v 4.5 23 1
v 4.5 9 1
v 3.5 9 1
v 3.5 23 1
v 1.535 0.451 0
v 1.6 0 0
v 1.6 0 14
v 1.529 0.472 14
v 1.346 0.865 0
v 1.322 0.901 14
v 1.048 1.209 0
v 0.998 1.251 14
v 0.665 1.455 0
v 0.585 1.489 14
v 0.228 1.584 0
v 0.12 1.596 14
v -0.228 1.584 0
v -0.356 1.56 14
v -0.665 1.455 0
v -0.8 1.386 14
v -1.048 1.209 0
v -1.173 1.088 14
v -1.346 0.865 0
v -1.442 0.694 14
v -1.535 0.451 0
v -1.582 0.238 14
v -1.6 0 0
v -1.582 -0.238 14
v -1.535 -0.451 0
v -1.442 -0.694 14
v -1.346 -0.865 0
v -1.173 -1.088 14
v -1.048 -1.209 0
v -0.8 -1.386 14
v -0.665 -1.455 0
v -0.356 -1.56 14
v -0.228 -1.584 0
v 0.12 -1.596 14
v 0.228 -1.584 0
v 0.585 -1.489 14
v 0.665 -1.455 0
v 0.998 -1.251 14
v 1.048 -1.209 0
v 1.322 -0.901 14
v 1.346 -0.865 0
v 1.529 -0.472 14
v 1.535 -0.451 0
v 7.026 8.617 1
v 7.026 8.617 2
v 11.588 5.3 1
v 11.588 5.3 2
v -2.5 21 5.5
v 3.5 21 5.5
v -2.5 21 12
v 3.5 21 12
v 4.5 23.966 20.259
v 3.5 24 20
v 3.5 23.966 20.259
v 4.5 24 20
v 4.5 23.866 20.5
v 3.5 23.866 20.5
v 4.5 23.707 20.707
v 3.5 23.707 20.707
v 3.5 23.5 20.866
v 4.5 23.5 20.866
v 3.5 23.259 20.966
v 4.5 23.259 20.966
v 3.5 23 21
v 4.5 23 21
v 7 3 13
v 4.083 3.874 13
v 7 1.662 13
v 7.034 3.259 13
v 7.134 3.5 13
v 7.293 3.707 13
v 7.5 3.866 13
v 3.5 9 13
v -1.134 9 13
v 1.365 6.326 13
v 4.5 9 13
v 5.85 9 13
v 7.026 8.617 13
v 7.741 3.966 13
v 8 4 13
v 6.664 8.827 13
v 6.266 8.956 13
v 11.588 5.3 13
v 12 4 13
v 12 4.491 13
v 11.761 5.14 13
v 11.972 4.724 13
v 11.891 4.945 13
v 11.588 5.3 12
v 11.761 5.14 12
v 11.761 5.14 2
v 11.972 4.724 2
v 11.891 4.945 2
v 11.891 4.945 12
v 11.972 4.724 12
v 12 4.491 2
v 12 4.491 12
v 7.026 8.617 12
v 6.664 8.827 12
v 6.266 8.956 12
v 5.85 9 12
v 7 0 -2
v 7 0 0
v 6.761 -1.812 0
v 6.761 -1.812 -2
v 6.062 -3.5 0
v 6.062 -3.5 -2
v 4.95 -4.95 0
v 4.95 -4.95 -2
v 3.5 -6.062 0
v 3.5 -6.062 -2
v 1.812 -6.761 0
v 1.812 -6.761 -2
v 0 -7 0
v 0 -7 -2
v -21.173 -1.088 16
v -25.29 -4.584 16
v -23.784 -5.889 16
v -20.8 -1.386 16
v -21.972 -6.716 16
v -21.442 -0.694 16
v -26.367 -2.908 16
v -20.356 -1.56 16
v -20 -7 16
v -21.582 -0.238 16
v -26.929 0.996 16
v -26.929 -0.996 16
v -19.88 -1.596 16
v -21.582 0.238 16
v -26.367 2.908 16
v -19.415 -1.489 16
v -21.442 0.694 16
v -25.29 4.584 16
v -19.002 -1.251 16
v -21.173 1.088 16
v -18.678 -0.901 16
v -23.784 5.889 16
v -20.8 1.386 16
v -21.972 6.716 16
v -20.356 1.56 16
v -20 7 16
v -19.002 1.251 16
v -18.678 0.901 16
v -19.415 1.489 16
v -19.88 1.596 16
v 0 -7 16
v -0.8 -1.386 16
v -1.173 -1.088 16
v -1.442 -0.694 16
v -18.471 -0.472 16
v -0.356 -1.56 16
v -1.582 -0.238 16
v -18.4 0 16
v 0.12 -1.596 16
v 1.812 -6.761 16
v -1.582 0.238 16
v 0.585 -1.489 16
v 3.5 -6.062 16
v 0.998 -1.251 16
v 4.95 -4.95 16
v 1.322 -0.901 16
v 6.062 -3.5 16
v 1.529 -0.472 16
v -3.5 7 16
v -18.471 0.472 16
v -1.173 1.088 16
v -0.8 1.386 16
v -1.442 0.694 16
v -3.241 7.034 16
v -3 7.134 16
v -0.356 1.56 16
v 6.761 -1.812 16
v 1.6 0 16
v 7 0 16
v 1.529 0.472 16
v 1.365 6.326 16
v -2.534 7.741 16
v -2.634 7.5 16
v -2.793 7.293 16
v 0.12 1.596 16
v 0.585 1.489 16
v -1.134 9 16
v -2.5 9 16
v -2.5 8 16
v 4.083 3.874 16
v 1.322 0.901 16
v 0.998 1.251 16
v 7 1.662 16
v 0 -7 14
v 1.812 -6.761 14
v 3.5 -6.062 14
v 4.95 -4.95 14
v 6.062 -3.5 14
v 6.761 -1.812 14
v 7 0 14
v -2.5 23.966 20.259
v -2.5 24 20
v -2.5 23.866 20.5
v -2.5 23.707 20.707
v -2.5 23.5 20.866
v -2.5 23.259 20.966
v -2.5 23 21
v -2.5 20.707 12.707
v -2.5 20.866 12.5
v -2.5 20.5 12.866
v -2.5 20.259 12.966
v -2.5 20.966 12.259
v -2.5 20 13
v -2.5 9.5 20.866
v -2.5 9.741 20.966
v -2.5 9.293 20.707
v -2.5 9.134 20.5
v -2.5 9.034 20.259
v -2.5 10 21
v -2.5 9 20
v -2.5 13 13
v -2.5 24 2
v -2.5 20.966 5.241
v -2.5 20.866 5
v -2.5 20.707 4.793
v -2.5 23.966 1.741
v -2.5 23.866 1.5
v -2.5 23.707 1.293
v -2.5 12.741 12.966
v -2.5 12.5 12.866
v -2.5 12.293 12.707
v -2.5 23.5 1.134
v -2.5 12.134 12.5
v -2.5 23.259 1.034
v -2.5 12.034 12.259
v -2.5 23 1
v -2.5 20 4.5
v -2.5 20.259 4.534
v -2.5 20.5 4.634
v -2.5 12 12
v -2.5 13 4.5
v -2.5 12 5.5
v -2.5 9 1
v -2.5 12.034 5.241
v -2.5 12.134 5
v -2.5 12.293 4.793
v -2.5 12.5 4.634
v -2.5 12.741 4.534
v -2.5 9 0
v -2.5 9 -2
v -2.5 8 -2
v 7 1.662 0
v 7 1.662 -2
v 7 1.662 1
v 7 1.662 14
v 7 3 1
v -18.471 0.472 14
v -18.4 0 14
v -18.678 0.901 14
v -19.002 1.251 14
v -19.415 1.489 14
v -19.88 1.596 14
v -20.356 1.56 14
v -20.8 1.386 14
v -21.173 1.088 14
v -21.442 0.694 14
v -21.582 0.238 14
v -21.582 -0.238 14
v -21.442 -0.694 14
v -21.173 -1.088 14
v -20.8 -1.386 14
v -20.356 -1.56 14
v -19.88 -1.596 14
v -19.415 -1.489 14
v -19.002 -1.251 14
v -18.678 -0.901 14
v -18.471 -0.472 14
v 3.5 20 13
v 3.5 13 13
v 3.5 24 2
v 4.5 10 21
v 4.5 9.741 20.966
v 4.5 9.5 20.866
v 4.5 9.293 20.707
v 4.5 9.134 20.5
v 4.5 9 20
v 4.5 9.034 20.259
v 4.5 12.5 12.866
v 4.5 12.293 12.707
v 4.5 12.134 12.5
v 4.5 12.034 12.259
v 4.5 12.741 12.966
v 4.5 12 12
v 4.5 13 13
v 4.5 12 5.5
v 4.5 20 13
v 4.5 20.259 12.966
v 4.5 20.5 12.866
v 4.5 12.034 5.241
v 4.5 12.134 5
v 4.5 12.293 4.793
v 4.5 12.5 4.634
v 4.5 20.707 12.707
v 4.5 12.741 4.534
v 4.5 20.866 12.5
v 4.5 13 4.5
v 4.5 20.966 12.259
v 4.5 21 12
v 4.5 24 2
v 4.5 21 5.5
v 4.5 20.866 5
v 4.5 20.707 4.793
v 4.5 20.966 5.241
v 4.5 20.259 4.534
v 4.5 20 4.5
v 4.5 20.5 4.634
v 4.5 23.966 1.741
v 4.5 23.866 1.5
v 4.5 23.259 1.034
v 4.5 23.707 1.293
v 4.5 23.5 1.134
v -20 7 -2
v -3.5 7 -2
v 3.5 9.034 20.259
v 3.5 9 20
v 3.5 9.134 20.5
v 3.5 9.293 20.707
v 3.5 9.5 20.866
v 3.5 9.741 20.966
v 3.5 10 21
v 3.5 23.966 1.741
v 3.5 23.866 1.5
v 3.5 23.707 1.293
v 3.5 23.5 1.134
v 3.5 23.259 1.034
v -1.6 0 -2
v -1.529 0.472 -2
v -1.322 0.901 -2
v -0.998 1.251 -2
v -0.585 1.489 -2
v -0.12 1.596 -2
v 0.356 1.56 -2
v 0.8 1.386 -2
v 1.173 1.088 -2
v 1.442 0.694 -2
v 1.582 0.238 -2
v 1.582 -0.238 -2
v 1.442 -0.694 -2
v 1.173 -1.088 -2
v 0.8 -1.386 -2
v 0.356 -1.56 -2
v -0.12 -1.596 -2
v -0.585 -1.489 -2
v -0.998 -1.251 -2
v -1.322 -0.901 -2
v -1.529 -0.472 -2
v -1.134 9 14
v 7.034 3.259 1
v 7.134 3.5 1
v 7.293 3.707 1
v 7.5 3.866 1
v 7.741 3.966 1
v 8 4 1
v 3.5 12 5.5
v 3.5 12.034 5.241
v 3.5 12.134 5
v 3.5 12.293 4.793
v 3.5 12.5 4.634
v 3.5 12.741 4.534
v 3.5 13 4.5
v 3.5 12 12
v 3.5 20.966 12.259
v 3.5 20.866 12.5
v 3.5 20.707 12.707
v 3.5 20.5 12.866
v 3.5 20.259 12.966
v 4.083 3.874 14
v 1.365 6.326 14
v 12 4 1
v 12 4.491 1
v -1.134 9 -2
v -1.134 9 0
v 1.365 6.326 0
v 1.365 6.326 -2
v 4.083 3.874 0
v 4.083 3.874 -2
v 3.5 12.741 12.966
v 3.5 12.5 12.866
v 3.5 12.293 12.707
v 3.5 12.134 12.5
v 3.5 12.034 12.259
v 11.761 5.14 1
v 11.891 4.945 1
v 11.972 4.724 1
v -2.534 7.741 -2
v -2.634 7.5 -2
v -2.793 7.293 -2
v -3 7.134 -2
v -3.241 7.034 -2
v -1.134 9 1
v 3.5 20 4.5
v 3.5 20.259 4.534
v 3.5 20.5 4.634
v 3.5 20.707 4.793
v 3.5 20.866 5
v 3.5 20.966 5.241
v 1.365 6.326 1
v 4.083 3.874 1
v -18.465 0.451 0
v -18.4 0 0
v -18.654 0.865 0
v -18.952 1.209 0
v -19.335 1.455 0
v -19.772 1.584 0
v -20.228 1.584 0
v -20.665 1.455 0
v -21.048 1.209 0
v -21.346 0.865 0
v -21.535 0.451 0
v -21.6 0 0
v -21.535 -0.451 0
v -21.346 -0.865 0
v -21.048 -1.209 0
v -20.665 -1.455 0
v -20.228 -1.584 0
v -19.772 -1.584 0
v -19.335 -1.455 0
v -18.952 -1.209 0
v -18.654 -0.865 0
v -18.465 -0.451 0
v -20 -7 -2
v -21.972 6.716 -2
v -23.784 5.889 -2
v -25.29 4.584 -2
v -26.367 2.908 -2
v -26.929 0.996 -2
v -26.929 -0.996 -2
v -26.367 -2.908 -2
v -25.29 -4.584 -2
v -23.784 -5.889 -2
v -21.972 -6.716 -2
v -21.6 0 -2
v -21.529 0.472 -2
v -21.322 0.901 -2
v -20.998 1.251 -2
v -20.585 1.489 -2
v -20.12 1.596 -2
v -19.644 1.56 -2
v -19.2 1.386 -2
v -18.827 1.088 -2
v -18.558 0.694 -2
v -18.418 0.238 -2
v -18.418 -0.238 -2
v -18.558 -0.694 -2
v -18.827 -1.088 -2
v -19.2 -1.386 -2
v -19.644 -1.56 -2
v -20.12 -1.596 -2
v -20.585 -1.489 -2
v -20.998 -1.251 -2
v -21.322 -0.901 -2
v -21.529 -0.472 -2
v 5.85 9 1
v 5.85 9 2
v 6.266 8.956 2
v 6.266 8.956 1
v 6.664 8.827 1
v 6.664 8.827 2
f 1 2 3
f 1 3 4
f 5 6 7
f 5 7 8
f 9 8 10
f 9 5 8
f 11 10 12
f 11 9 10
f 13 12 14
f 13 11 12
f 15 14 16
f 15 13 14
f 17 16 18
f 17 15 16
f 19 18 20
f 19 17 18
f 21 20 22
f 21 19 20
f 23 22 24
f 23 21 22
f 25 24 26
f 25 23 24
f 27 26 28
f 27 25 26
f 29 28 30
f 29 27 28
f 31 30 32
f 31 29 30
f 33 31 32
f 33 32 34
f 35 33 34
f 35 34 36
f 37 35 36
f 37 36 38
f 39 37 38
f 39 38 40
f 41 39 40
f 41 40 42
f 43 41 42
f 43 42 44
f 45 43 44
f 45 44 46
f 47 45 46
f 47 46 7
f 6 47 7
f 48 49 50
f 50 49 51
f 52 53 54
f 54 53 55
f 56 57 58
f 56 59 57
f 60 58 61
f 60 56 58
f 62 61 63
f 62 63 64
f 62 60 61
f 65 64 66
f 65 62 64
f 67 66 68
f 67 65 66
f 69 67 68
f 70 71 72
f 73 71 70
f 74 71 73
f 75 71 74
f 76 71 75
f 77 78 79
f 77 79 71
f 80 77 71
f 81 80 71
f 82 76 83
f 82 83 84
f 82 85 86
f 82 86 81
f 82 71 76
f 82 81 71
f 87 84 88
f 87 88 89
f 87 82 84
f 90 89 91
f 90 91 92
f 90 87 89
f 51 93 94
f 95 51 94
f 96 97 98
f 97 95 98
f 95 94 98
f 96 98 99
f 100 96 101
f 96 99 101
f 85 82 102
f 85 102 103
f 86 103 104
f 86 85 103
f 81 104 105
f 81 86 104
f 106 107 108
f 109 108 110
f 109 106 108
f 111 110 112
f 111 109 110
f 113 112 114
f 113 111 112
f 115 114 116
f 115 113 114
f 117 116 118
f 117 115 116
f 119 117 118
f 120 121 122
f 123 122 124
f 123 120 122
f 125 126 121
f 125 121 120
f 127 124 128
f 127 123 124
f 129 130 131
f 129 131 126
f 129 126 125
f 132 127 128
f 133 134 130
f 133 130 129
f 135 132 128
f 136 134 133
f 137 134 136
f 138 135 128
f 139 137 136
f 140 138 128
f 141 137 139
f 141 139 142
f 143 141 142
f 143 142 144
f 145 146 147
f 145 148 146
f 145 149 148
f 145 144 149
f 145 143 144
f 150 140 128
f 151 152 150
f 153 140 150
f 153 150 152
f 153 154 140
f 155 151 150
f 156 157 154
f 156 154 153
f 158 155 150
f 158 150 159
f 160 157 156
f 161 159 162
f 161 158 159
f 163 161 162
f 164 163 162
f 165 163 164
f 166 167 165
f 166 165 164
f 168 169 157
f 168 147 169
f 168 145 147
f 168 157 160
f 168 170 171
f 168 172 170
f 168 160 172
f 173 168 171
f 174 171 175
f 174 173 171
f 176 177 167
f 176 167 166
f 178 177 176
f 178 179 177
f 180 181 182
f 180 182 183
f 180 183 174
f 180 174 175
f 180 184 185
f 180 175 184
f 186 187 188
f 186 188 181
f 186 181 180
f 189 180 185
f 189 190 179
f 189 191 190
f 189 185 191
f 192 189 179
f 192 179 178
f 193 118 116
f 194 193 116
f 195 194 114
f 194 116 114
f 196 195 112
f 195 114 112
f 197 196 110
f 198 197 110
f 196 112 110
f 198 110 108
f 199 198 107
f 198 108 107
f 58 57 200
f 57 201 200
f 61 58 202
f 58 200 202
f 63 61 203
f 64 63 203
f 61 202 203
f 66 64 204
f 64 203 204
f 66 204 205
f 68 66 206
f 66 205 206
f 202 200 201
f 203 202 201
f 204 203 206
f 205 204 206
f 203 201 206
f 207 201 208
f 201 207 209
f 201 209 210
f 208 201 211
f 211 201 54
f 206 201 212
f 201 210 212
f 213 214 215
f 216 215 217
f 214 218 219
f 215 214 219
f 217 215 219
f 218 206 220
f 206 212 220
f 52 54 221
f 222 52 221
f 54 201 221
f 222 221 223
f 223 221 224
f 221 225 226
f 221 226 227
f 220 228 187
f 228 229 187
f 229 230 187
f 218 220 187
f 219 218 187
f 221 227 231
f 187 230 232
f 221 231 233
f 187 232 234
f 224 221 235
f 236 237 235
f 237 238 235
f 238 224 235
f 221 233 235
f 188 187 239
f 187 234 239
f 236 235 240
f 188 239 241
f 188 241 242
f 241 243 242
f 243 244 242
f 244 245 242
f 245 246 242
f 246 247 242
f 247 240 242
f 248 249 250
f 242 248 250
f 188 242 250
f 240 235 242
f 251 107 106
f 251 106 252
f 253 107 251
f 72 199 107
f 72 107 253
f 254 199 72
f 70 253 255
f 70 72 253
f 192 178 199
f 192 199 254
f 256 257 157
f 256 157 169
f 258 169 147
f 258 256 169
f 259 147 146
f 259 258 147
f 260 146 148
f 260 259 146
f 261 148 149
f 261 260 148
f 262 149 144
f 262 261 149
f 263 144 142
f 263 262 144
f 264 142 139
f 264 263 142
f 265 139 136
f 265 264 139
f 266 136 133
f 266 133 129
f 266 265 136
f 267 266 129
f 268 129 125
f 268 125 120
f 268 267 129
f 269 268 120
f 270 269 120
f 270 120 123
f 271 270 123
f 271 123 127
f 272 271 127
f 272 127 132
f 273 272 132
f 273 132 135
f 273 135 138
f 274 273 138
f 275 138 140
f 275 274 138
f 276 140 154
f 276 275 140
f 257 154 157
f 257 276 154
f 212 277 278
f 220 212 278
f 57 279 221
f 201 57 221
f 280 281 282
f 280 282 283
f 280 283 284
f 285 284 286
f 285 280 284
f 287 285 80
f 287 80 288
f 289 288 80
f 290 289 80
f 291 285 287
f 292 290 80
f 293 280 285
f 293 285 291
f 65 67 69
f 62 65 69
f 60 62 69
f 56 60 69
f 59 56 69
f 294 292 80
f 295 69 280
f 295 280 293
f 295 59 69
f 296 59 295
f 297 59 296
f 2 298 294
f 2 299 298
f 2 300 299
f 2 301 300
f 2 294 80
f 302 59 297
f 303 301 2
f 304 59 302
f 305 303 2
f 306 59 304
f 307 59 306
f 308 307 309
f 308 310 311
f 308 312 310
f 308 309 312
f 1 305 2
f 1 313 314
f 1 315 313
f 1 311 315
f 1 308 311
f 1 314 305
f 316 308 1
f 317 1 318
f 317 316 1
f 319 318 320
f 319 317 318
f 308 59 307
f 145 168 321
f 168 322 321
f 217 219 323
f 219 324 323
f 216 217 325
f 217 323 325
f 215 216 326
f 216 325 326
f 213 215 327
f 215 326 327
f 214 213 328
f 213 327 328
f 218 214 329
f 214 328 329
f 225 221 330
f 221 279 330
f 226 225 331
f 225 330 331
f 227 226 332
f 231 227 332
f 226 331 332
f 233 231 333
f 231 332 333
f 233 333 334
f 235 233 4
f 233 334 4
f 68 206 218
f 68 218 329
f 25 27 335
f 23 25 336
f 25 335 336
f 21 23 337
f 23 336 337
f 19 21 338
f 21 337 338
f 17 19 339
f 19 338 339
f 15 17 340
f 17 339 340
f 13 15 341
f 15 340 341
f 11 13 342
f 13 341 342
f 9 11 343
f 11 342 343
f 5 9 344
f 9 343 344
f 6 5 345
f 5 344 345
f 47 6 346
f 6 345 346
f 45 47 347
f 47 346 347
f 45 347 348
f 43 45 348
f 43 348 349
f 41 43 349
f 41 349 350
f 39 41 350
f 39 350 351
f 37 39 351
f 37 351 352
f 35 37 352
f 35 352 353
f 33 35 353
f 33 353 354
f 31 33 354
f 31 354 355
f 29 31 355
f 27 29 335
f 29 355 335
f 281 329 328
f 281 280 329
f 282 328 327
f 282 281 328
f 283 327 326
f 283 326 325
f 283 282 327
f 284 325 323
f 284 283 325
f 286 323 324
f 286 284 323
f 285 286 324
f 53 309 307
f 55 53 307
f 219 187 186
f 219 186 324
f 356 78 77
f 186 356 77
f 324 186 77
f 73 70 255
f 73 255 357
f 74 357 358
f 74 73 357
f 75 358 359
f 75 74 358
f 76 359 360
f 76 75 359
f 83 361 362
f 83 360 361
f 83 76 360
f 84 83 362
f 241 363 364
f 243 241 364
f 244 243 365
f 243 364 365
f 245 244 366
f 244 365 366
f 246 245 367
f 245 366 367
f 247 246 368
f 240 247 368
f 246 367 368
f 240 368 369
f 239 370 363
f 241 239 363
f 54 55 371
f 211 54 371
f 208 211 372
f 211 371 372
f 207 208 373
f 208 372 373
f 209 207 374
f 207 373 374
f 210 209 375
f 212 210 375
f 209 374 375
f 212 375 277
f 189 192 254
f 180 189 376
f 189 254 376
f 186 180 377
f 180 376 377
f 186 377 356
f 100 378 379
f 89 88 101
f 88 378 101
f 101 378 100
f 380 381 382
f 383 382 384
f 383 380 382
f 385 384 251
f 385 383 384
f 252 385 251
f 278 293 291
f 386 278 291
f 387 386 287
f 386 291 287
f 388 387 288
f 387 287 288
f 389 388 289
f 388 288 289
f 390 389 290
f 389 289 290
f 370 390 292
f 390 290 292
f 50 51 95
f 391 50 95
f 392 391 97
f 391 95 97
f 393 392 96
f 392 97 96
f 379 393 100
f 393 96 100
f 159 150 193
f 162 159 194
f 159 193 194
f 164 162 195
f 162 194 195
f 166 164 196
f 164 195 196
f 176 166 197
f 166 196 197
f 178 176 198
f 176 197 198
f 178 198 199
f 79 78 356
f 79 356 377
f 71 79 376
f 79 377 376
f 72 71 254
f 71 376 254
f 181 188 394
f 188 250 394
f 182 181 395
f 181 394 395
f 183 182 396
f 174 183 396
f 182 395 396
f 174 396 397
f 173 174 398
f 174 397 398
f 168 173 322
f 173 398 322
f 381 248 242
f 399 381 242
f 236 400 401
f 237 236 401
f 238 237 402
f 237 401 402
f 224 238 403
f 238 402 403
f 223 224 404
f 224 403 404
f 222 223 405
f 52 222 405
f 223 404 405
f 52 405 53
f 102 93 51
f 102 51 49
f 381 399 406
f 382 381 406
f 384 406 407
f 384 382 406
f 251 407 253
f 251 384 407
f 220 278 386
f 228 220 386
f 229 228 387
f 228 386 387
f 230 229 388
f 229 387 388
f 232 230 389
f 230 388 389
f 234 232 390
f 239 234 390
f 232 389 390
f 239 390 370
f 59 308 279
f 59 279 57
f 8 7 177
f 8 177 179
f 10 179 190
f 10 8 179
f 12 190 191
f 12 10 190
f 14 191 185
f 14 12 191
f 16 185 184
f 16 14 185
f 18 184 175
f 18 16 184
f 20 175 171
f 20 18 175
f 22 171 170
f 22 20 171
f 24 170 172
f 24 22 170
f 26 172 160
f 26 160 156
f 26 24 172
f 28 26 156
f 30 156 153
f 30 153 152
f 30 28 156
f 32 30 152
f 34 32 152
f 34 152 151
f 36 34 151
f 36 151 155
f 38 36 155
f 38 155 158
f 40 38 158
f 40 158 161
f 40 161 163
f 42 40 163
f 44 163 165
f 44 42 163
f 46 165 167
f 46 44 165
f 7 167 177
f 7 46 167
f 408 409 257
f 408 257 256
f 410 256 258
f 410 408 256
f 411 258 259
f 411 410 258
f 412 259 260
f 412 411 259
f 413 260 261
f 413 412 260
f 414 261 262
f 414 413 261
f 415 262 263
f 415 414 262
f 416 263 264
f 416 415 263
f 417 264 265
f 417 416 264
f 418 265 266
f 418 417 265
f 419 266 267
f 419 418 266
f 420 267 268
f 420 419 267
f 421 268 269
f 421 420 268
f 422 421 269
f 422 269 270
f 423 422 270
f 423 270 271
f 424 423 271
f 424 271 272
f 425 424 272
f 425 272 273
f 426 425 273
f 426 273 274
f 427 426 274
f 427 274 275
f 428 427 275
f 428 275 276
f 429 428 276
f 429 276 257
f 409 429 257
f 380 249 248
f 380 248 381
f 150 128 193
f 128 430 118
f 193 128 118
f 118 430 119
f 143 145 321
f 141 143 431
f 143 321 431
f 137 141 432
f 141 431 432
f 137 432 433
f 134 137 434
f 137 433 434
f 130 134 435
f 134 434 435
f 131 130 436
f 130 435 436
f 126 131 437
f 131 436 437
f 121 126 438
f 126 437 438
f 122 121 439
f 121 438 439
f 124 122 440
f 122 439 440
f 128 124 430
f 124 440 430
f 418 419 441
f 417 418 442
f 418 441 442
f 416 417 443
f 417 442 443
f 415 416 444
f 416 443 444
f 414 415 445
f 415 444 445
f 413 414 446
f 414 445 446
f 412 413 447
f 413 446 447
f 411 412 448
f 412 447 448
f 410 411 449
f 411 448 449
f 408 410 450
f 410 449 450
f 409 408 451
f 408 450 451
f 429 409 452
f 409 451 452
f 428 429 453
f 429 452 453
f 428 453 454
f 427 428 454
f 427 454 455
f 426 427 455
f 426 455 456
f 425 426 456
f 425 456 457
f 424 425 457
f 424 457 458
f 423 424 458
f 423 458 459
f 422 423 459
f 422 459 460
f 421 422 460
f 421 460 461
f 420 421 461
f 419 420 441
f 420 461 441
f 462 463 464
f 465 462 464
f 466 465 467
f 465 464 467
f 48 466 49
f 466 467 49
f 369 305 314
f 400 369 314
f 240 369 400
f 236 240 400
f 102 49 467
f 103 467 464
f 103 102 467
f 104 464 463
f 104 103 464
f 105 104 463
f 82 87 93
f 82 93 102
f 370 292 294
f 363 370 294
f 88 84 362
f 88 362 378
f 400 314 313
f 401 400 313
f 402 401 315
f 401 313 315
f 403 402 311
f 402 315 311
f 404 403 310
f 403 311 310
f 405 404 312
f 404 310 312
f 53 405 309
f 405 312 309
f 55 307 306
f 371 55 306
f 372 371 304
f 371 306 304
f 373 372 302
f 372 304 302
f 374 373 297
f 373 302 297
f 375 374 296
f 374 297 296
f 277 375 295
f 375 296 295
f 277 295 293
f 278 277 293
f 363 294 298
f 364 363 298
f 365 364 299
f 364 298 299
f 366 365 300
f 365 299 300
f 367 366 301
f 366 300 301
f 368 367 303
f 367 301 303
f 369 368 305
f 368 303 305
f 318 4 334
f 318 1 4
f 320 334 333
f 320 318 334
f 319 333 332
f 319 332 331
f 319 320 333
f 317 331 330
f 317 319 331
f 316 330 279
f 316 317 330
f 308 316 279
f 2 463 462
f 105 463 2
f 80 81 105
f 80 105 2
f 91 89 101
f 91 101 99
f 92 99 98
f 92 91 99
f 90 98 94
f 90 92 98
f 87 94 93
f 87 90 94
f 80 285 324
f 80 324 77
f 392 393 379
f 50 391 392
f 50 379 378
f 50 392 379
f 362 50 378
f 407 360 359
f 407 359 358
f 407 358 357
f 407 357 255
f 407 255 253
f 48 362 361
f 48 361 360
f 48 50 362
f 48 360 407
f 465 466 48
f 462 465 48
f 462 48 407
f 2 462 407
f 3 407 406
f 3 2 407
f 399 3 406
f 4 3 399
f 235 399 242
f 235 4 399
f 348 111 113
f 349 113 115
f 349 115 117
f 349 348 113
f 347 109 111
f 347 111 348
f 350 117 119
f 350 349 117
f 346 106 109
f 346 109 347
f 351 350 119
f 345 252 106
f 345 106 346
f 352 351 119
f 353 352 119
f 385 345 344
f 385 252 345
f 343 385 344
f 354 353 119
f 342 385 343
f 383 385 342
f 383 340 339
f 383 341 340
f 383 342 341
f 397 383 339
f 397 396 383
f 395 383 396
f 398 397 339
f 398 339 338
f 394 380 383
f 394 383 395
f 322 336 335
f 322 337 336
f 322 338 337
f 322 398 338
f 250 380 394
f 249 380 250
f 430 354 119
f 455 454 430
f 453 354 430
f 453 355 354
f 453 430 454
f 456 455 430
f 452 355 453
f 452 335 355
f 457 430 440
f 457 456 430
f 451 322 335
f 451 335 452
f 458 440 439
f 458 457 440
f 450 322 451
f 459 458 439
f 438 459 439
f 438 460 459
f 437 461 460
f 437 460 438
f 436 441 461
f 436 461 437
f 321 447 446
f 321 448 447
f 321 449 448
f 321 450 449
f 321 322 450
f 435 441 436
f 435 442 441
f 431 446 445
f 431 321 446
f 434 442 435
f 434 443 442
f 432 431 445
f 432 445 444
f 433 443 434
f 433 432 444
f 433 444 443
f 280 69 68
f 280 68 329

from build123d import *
from build123d.topology import SkipClean

# Parameters (mm, degrees)
SKETCH_1_R          = 7
SKETCH_1_R_2        = 1.6
EXTRUDE_1_DEPTH     = 14
FILLET_2_R          = 1
FILLET_4_R          = 2
FILLET_5_R          = 1
CUT_EXTRUDE_1_DEPTH = 10
SKETCH_4_R          = 43
SKETCH_4_W          = 56
SKETCH_4_H          = 56
CUT_EXTRUDE_2_DEPTH = 2
SKETCH_5_R          = 1.6
EXTRUDE_3_DEPTH     = 2
EXTRUDE_START       = 2
SKETCH_6_R          = 1.6
EXTRUDE_4_DEPTH     = 2
EXTRUDE_START_2     = 1
EXTRUDE_6_DEPTH     = 1
EXTRUDE_7_DEPTH     = 1
EXTRUDE_8_DEPTH     = 8
CUT_EXTRUDE_3_DEPTH = 45.127655727
FILLET_6_R          = 1
EXTRUDE_10_DEPTH    = 1


with BuildPart() as part:
    # 草图1 → 凸台-拉伸1 (new body)
    # profile 1 of 3: a face of its own
    with BuildSketch(Plane.XY):
        with BuildLine():
            Line((-2.5, 7), (-20, 7))
            ThreePointArc((-20, 7), (-15.050252532, 4.949747468), (-13, 0))
            ThreePointArc((-13, 0), (-15.050252532, -4.949747468), (-20, -7))
            Line((-20, -7), (0, -7))
            ThreePointArc((0, -7), (-4.949747468, 4.949747468), (7, 0))
            Line((7, 0), (7, 4))
            Line((7, 4), (12, 4))
            Line((12, 4), (12, 5))
            Line((12, 5), (6.5, 9))
            Line((6.5, 9), (3.5, 9))
            Line((3.5, 9), (3.5, 26))
            Line((3.5, 26), (-2.5, 26))
            Line((-2.5, 26), (-2.5, 7))
        make_face()
    # profile 2 of 3: a face of its own
    with BuildSketch(Plane.XY):
        Circle(SKETCH_1_R)
        Circle(SKETCH_1_R_2, mode=Mode.SUBTRACT)
    # profile 3 of 3: a face of its own
    with BuildSketch(Plane.XY):
        with Locations((-20, 0)):
            Circle(SKETCH_1_R)
        with Locations((-20, 0)):
            Circle(SKETCH_1_R_2, mode=Mode.SUBTRACT)
    extrude(amount=EXTRUDE_1_DEPTH)

    # 圆角2
    fillet_2_edges = [part.edges().sort_by_distance(p)[0] for p in [
        (-2.5, 7, 7),
        (7, 4, 7),
    ]]
    fillet(fillet_2_edges, radius=FILLET_2_R)

    # 圆角4
    fillet_4_edges = [part.edges().sort_by_distance(p)[0] for p in [
        (6.5, 9, 7),
    ]]
    fillet(fillet_4_edges, radius=FILLET_4_R)

    # 圆角5
    fillet_5_edges = [part.edges().sort_by_distance(p)[0] for p in [
        (12, 5, 7),
    ]]
    fillet(fillet_5_edges, radius=FILLET_5_R)

    # 草图2 → 切除-拉伸1 (cut)
    with BuildSketch(Plane(origin=(3.5, 0, 0), x_dir=(0, 0, -1), z_dir=(1, 0, 0))):
        Polygon((-12, 9), (-14, 9), (-14, 26), (0, 26), (0, 9), (-2, 9), (-2, 24), (-12, 24), align=None)
    extrude(amount=-CUT_EXTRUDE_1_DEPTH, mode=Mode.SUBTRACT)

    # 草图4 → 切除-拉伸2 (cut)
    with BuildSketch(Plane.XY.offset(14)):
        with Locations((31.5, 37)):
            Circle(SKETCH_4_R)
        with Locations((31.5, 37)):
            Rectangle(SKETCH_4_W, SKETCH_4_H, mode=Mode.SUBTRACT)
    cut_extrude_2 = extrude(amount=-CUT_EXTRUDE_2_DEPTH, mode=Mode.SUBTRACT)

    # 镜向1: 切除-拉伸2 across plane
    add(cut_extrude_2.mirror(Plane.XY.offset(7)), mode=Mode.SUBTRACT)

    # 草图5 → 凸台-拉伸3 (add)
    with SkipClean():  # the faces are left unmerged after this step: merging them gives an invalid solid
        with BuildSketch(Plane.XY.offset(14)):
            with BuildLine():
                Line((-1.134337744, 9), (-2.5, 9))
                Line((-2.5, 9), (-2.5, 8))
                ThreePointArc((-2.5, 8), (-2.792893219, 7.292893219), (-3.5, 7))
                Line((-3.5, 7), (-20, 7))
                ThreePointArc((-20, 7), (-27, 0), (-20, -7))
                Line((-20, -7), (0, -7))
                ThreePointArc((0, -7), (4.949747468, -4.949747468), (7, 0))
                Line((7, 0), (7, 1.662343032))
                ThreePointArc((7, 1.662343032), (2.698204226, 5.071070168), (-1.134337744, 9))
            make_face()
            Circle(SKETCH_5_R, mode=Mode.SUBTRACT)
            with Locations((-20, 0)):
                Circle(SKETCH_5_R, mode=Mode.SUBTRACT)
        extrude(amount=EXTRUDE_3_DEPTH)

    # 草图6 → 凸台-拉伸4 (add)
    with SkipClean():  # the faces are left unmerged after this step: merging them gives an invalid solid
        with BuildSketch(Plane(origin=(0, 0, 0), x_dir=(-1, 0, 0), z_dir=(0, 0, -1)).offset(EXTRUDE_START)):
            with BuildLine():
                Line((-7, 1.662343032), (-7, 0))
                ThreePointArc((-7, 0), (-4.949747468, -4.949747468), (0, -7))
                Line((0, -7), (20, -7))
                ThreePointArc((20, -7), (27, 0), (20, 7))
                Line((20, 7), (3.5, 7))
                ThreePointArc((3.5, 7), (2.792893219, 7.292893219), (2.5, 8))
                Line((2.5, 8), (2.5, 9))
                Line((2.5, 9), (1.134337744, 9))
                ThreePointArc((1.134337744, 9), (-2.698204226, 5.071070168), (-7, 1.662343032))
            make_face()
            with Locations((20, 0)):
                Circle(SKETCH_6_R, mode=Mode.SUBTRACT)
            Circle(SKETCH_6_R, mode=Mode.SUBTRACT)
        extrude(amount=-EXTRUDE_4_DEPTH)

    # 草图8 → 凸台-拉伸6 (add)
    with SkipClean():  # the faces are left unmerged after this step: merging them gives an invalid solid
        with BuildSketch(Plane.XY.offset(12).offset(EXTRUDE_START_2)):
            with BuildLine():
                Line((-2.5, 9), (-1.134337744, 9))
                ThreePointArc((-1.134337744, 9), (2.698204226, 5.071070168), (7, 1.662343032))
                Line((7, 1.662343032), (7, 3))
                ThreePointArc((7, 3), (7.292893219, 3.707106781), (8, 4))
                Line((8, 4), (12, 4))
                Line((12, 4), (12, 4.490775408))
                ThreePointArc((12, 4.490775408), (11.891114947, 4.944553053), (11.588171698, 5.299511493))
                Line((11.588171698, 5.299511493), (7.025975768, 8.617472169))
                ThreePointArc((7.025975768, 8.617472169), (6.468120717, 8.901965344), (5.849632373, 9))
                Line((5.849632373, 9), (3.5, 9))
                Line((3.5, 9), (3.5, 24))
                Line((3.5, 24), (-2.5, 24))
                Line((-2.5, 24), (-2.5, 9))
            make_face()
        extrude(amount=-EXTRUDE_6_DEPTH)

    # 草图9 → 凸台-拉伸7 (add)
    with SkipClean():  # the faces are left unmerged after this step: merging them gives an invalid solid
        with BuildSketch(Plane(origin=(0, 0, 2), x_dir=(-1, 0, 0), z_dir=(0, 0, -1))):
            with BuildLine():
                Line((-3.5, 24), (-3.5, 9))
                Line((-3.5, 9), (-5.849632373, 9))
                ThreePointArc((-5.849632373, 9), (-6.468120717, 8.901965344), (-7.025975768, 8.617472169))
                Line((-7.025975768, 8.617472169), (-11.588171698, 5.299511493))
                ThreePointArc((-11.588171698, 5.299511493), (-11.891114947, 4.944553053), (-12, 4.490775408))
                Line((-12, 4.490775408), (-12, 4))
                Line((-12, 4), (-8, 4))
                ThreePointArc((-8, 4), (-7.292893219, 3.707106781), (-7, 3))
                Line((-7, 3), (-7, 1.662343032))
                ThreePointArc((-7, 1.662343032), (-2.698204226, 5.071070168), (1.134337744, 9))
                Line((1.134337744, 9), (2.5, 9))
                Line((2.5, 9), (2.5, 24))
                Line((2.5, 24), (-3.5, 24))
            make_face()
        extrude(amount=EXTRUDE_7_DEPTH)

    # 草图14 → 凸台-拉伸8 (add)
    with SkipClean():  # the faces are left unmerged after this step: merging them gives an invalid solid
        with BuildSketch(Plane.XY.offset(13)):
            Polygon((-1.134337744, 9), (3.5, 9), (3.5, 24), (-2.5, 24), (-2.5, 9), align=None)
        extrude(amount=EXTRUDE_8_DEPTH)

    # 草图13 → 切除-拉伸3 (cut, through all)
    with SkipClean():  # the faces are left unmerged after this step: merging them gives an invalid solid
        with BuildSketch(Plane(origin=(3.5, 0, 0), x_dir=(0, 0, -1), z_dir=(1, 0, 0))):
            with BuildLine():
                Line((-13, 20), (-13, 13))
                ThreePointArc((-13, 13), (-12.707106781, 12.292893219), (-12, 12))
                Line((-12, 12), (-5.5, 12))
                ThreePointArc((-5.5, 12), (-4.792893219, 12.292893219), (-4.5, 13))
                Line((-4.5, 13), (-4.5, 20))
                ThreePointArc((-4.5, 20), (-4.792893219, 20.707106781), (-5.5, 21))
                Line((-5.5, 21), (-12, 21))
                ThreePointArc((-12, 21), (-12.707106781, 20.707106781), (-13, 20))
            make_face()
        extrude(amount=-CUT_EXTRUDE_3_DEPTH, mode=Mode.SUBTRACT)

    # 圆角6
    fillet_6_edges = [part.edges().sort_by_distance(p)[0] for p in [
        (0.5, 24, 1),
        (0.5, 24, 21),
        (0.5, 9, 21),
    ]]
    fillet(fillet_6_edges, radius=FILLET_6_R - 0.0001)  # a hair under: the kernel refuses the full size

    # 草图16 → 凸台-拉伸10 (add)
    with SkipClean():  # the faces are left unmerged after this step: merging them gives an invalid solid
        with BuildSketch(Plane(origin=(3.5, 0, 0), x_dir=(0, 0, -1), z_dir=(1, 0, 0)).offset(EXTRUDE_START_2)):
            with BuildLine():
                Line((-1, 9), (-1, 23))
                ThreePointArc((-1, 23), (-1.292893219, 23.707106781), (-2, 24))
                Line((-2, 24), (-20, 24))
                ThreePointArc((-20, 24), (-20.707106781, 23.707106781), (-21, 23))
                Line((-21, 23), (-21, 10))
                ThreePointArc((-21, 10), (-20.707106781, 9.292893219), (-20, 9))
                Line((-20, 9), (-13, 9))
                Line((-13, 9), (-1, 9))
            make_face()
            with BuildLine():
                Line((-12, 12), (-5.5, 12))
                ThreePointArc((-5.5, 12), (-4.792893219, 12.292893219), (-4.5, 13))
                Line((-4.5, 13), (-4.5, 20))
                ThreePointArc((-4.5, 20), (-4.792893219, 20.707106781), (-5.5, 21))
                Line((-5.5, 21), (-12, 21))
                ThreePointArc((-12, 21), (-12.707106781, 20.707106781), (-13, 20))
                Line((-13, 20), (-13, 13))
                ThreePointArc((-13, 13), (-12.707106781, 12.292893219), (-12, 12))
            make_face(mode=Mode.SUBTRACT)
        extrude(amount=-EXTRUDE_10_DEPTH)


solid = part.part
